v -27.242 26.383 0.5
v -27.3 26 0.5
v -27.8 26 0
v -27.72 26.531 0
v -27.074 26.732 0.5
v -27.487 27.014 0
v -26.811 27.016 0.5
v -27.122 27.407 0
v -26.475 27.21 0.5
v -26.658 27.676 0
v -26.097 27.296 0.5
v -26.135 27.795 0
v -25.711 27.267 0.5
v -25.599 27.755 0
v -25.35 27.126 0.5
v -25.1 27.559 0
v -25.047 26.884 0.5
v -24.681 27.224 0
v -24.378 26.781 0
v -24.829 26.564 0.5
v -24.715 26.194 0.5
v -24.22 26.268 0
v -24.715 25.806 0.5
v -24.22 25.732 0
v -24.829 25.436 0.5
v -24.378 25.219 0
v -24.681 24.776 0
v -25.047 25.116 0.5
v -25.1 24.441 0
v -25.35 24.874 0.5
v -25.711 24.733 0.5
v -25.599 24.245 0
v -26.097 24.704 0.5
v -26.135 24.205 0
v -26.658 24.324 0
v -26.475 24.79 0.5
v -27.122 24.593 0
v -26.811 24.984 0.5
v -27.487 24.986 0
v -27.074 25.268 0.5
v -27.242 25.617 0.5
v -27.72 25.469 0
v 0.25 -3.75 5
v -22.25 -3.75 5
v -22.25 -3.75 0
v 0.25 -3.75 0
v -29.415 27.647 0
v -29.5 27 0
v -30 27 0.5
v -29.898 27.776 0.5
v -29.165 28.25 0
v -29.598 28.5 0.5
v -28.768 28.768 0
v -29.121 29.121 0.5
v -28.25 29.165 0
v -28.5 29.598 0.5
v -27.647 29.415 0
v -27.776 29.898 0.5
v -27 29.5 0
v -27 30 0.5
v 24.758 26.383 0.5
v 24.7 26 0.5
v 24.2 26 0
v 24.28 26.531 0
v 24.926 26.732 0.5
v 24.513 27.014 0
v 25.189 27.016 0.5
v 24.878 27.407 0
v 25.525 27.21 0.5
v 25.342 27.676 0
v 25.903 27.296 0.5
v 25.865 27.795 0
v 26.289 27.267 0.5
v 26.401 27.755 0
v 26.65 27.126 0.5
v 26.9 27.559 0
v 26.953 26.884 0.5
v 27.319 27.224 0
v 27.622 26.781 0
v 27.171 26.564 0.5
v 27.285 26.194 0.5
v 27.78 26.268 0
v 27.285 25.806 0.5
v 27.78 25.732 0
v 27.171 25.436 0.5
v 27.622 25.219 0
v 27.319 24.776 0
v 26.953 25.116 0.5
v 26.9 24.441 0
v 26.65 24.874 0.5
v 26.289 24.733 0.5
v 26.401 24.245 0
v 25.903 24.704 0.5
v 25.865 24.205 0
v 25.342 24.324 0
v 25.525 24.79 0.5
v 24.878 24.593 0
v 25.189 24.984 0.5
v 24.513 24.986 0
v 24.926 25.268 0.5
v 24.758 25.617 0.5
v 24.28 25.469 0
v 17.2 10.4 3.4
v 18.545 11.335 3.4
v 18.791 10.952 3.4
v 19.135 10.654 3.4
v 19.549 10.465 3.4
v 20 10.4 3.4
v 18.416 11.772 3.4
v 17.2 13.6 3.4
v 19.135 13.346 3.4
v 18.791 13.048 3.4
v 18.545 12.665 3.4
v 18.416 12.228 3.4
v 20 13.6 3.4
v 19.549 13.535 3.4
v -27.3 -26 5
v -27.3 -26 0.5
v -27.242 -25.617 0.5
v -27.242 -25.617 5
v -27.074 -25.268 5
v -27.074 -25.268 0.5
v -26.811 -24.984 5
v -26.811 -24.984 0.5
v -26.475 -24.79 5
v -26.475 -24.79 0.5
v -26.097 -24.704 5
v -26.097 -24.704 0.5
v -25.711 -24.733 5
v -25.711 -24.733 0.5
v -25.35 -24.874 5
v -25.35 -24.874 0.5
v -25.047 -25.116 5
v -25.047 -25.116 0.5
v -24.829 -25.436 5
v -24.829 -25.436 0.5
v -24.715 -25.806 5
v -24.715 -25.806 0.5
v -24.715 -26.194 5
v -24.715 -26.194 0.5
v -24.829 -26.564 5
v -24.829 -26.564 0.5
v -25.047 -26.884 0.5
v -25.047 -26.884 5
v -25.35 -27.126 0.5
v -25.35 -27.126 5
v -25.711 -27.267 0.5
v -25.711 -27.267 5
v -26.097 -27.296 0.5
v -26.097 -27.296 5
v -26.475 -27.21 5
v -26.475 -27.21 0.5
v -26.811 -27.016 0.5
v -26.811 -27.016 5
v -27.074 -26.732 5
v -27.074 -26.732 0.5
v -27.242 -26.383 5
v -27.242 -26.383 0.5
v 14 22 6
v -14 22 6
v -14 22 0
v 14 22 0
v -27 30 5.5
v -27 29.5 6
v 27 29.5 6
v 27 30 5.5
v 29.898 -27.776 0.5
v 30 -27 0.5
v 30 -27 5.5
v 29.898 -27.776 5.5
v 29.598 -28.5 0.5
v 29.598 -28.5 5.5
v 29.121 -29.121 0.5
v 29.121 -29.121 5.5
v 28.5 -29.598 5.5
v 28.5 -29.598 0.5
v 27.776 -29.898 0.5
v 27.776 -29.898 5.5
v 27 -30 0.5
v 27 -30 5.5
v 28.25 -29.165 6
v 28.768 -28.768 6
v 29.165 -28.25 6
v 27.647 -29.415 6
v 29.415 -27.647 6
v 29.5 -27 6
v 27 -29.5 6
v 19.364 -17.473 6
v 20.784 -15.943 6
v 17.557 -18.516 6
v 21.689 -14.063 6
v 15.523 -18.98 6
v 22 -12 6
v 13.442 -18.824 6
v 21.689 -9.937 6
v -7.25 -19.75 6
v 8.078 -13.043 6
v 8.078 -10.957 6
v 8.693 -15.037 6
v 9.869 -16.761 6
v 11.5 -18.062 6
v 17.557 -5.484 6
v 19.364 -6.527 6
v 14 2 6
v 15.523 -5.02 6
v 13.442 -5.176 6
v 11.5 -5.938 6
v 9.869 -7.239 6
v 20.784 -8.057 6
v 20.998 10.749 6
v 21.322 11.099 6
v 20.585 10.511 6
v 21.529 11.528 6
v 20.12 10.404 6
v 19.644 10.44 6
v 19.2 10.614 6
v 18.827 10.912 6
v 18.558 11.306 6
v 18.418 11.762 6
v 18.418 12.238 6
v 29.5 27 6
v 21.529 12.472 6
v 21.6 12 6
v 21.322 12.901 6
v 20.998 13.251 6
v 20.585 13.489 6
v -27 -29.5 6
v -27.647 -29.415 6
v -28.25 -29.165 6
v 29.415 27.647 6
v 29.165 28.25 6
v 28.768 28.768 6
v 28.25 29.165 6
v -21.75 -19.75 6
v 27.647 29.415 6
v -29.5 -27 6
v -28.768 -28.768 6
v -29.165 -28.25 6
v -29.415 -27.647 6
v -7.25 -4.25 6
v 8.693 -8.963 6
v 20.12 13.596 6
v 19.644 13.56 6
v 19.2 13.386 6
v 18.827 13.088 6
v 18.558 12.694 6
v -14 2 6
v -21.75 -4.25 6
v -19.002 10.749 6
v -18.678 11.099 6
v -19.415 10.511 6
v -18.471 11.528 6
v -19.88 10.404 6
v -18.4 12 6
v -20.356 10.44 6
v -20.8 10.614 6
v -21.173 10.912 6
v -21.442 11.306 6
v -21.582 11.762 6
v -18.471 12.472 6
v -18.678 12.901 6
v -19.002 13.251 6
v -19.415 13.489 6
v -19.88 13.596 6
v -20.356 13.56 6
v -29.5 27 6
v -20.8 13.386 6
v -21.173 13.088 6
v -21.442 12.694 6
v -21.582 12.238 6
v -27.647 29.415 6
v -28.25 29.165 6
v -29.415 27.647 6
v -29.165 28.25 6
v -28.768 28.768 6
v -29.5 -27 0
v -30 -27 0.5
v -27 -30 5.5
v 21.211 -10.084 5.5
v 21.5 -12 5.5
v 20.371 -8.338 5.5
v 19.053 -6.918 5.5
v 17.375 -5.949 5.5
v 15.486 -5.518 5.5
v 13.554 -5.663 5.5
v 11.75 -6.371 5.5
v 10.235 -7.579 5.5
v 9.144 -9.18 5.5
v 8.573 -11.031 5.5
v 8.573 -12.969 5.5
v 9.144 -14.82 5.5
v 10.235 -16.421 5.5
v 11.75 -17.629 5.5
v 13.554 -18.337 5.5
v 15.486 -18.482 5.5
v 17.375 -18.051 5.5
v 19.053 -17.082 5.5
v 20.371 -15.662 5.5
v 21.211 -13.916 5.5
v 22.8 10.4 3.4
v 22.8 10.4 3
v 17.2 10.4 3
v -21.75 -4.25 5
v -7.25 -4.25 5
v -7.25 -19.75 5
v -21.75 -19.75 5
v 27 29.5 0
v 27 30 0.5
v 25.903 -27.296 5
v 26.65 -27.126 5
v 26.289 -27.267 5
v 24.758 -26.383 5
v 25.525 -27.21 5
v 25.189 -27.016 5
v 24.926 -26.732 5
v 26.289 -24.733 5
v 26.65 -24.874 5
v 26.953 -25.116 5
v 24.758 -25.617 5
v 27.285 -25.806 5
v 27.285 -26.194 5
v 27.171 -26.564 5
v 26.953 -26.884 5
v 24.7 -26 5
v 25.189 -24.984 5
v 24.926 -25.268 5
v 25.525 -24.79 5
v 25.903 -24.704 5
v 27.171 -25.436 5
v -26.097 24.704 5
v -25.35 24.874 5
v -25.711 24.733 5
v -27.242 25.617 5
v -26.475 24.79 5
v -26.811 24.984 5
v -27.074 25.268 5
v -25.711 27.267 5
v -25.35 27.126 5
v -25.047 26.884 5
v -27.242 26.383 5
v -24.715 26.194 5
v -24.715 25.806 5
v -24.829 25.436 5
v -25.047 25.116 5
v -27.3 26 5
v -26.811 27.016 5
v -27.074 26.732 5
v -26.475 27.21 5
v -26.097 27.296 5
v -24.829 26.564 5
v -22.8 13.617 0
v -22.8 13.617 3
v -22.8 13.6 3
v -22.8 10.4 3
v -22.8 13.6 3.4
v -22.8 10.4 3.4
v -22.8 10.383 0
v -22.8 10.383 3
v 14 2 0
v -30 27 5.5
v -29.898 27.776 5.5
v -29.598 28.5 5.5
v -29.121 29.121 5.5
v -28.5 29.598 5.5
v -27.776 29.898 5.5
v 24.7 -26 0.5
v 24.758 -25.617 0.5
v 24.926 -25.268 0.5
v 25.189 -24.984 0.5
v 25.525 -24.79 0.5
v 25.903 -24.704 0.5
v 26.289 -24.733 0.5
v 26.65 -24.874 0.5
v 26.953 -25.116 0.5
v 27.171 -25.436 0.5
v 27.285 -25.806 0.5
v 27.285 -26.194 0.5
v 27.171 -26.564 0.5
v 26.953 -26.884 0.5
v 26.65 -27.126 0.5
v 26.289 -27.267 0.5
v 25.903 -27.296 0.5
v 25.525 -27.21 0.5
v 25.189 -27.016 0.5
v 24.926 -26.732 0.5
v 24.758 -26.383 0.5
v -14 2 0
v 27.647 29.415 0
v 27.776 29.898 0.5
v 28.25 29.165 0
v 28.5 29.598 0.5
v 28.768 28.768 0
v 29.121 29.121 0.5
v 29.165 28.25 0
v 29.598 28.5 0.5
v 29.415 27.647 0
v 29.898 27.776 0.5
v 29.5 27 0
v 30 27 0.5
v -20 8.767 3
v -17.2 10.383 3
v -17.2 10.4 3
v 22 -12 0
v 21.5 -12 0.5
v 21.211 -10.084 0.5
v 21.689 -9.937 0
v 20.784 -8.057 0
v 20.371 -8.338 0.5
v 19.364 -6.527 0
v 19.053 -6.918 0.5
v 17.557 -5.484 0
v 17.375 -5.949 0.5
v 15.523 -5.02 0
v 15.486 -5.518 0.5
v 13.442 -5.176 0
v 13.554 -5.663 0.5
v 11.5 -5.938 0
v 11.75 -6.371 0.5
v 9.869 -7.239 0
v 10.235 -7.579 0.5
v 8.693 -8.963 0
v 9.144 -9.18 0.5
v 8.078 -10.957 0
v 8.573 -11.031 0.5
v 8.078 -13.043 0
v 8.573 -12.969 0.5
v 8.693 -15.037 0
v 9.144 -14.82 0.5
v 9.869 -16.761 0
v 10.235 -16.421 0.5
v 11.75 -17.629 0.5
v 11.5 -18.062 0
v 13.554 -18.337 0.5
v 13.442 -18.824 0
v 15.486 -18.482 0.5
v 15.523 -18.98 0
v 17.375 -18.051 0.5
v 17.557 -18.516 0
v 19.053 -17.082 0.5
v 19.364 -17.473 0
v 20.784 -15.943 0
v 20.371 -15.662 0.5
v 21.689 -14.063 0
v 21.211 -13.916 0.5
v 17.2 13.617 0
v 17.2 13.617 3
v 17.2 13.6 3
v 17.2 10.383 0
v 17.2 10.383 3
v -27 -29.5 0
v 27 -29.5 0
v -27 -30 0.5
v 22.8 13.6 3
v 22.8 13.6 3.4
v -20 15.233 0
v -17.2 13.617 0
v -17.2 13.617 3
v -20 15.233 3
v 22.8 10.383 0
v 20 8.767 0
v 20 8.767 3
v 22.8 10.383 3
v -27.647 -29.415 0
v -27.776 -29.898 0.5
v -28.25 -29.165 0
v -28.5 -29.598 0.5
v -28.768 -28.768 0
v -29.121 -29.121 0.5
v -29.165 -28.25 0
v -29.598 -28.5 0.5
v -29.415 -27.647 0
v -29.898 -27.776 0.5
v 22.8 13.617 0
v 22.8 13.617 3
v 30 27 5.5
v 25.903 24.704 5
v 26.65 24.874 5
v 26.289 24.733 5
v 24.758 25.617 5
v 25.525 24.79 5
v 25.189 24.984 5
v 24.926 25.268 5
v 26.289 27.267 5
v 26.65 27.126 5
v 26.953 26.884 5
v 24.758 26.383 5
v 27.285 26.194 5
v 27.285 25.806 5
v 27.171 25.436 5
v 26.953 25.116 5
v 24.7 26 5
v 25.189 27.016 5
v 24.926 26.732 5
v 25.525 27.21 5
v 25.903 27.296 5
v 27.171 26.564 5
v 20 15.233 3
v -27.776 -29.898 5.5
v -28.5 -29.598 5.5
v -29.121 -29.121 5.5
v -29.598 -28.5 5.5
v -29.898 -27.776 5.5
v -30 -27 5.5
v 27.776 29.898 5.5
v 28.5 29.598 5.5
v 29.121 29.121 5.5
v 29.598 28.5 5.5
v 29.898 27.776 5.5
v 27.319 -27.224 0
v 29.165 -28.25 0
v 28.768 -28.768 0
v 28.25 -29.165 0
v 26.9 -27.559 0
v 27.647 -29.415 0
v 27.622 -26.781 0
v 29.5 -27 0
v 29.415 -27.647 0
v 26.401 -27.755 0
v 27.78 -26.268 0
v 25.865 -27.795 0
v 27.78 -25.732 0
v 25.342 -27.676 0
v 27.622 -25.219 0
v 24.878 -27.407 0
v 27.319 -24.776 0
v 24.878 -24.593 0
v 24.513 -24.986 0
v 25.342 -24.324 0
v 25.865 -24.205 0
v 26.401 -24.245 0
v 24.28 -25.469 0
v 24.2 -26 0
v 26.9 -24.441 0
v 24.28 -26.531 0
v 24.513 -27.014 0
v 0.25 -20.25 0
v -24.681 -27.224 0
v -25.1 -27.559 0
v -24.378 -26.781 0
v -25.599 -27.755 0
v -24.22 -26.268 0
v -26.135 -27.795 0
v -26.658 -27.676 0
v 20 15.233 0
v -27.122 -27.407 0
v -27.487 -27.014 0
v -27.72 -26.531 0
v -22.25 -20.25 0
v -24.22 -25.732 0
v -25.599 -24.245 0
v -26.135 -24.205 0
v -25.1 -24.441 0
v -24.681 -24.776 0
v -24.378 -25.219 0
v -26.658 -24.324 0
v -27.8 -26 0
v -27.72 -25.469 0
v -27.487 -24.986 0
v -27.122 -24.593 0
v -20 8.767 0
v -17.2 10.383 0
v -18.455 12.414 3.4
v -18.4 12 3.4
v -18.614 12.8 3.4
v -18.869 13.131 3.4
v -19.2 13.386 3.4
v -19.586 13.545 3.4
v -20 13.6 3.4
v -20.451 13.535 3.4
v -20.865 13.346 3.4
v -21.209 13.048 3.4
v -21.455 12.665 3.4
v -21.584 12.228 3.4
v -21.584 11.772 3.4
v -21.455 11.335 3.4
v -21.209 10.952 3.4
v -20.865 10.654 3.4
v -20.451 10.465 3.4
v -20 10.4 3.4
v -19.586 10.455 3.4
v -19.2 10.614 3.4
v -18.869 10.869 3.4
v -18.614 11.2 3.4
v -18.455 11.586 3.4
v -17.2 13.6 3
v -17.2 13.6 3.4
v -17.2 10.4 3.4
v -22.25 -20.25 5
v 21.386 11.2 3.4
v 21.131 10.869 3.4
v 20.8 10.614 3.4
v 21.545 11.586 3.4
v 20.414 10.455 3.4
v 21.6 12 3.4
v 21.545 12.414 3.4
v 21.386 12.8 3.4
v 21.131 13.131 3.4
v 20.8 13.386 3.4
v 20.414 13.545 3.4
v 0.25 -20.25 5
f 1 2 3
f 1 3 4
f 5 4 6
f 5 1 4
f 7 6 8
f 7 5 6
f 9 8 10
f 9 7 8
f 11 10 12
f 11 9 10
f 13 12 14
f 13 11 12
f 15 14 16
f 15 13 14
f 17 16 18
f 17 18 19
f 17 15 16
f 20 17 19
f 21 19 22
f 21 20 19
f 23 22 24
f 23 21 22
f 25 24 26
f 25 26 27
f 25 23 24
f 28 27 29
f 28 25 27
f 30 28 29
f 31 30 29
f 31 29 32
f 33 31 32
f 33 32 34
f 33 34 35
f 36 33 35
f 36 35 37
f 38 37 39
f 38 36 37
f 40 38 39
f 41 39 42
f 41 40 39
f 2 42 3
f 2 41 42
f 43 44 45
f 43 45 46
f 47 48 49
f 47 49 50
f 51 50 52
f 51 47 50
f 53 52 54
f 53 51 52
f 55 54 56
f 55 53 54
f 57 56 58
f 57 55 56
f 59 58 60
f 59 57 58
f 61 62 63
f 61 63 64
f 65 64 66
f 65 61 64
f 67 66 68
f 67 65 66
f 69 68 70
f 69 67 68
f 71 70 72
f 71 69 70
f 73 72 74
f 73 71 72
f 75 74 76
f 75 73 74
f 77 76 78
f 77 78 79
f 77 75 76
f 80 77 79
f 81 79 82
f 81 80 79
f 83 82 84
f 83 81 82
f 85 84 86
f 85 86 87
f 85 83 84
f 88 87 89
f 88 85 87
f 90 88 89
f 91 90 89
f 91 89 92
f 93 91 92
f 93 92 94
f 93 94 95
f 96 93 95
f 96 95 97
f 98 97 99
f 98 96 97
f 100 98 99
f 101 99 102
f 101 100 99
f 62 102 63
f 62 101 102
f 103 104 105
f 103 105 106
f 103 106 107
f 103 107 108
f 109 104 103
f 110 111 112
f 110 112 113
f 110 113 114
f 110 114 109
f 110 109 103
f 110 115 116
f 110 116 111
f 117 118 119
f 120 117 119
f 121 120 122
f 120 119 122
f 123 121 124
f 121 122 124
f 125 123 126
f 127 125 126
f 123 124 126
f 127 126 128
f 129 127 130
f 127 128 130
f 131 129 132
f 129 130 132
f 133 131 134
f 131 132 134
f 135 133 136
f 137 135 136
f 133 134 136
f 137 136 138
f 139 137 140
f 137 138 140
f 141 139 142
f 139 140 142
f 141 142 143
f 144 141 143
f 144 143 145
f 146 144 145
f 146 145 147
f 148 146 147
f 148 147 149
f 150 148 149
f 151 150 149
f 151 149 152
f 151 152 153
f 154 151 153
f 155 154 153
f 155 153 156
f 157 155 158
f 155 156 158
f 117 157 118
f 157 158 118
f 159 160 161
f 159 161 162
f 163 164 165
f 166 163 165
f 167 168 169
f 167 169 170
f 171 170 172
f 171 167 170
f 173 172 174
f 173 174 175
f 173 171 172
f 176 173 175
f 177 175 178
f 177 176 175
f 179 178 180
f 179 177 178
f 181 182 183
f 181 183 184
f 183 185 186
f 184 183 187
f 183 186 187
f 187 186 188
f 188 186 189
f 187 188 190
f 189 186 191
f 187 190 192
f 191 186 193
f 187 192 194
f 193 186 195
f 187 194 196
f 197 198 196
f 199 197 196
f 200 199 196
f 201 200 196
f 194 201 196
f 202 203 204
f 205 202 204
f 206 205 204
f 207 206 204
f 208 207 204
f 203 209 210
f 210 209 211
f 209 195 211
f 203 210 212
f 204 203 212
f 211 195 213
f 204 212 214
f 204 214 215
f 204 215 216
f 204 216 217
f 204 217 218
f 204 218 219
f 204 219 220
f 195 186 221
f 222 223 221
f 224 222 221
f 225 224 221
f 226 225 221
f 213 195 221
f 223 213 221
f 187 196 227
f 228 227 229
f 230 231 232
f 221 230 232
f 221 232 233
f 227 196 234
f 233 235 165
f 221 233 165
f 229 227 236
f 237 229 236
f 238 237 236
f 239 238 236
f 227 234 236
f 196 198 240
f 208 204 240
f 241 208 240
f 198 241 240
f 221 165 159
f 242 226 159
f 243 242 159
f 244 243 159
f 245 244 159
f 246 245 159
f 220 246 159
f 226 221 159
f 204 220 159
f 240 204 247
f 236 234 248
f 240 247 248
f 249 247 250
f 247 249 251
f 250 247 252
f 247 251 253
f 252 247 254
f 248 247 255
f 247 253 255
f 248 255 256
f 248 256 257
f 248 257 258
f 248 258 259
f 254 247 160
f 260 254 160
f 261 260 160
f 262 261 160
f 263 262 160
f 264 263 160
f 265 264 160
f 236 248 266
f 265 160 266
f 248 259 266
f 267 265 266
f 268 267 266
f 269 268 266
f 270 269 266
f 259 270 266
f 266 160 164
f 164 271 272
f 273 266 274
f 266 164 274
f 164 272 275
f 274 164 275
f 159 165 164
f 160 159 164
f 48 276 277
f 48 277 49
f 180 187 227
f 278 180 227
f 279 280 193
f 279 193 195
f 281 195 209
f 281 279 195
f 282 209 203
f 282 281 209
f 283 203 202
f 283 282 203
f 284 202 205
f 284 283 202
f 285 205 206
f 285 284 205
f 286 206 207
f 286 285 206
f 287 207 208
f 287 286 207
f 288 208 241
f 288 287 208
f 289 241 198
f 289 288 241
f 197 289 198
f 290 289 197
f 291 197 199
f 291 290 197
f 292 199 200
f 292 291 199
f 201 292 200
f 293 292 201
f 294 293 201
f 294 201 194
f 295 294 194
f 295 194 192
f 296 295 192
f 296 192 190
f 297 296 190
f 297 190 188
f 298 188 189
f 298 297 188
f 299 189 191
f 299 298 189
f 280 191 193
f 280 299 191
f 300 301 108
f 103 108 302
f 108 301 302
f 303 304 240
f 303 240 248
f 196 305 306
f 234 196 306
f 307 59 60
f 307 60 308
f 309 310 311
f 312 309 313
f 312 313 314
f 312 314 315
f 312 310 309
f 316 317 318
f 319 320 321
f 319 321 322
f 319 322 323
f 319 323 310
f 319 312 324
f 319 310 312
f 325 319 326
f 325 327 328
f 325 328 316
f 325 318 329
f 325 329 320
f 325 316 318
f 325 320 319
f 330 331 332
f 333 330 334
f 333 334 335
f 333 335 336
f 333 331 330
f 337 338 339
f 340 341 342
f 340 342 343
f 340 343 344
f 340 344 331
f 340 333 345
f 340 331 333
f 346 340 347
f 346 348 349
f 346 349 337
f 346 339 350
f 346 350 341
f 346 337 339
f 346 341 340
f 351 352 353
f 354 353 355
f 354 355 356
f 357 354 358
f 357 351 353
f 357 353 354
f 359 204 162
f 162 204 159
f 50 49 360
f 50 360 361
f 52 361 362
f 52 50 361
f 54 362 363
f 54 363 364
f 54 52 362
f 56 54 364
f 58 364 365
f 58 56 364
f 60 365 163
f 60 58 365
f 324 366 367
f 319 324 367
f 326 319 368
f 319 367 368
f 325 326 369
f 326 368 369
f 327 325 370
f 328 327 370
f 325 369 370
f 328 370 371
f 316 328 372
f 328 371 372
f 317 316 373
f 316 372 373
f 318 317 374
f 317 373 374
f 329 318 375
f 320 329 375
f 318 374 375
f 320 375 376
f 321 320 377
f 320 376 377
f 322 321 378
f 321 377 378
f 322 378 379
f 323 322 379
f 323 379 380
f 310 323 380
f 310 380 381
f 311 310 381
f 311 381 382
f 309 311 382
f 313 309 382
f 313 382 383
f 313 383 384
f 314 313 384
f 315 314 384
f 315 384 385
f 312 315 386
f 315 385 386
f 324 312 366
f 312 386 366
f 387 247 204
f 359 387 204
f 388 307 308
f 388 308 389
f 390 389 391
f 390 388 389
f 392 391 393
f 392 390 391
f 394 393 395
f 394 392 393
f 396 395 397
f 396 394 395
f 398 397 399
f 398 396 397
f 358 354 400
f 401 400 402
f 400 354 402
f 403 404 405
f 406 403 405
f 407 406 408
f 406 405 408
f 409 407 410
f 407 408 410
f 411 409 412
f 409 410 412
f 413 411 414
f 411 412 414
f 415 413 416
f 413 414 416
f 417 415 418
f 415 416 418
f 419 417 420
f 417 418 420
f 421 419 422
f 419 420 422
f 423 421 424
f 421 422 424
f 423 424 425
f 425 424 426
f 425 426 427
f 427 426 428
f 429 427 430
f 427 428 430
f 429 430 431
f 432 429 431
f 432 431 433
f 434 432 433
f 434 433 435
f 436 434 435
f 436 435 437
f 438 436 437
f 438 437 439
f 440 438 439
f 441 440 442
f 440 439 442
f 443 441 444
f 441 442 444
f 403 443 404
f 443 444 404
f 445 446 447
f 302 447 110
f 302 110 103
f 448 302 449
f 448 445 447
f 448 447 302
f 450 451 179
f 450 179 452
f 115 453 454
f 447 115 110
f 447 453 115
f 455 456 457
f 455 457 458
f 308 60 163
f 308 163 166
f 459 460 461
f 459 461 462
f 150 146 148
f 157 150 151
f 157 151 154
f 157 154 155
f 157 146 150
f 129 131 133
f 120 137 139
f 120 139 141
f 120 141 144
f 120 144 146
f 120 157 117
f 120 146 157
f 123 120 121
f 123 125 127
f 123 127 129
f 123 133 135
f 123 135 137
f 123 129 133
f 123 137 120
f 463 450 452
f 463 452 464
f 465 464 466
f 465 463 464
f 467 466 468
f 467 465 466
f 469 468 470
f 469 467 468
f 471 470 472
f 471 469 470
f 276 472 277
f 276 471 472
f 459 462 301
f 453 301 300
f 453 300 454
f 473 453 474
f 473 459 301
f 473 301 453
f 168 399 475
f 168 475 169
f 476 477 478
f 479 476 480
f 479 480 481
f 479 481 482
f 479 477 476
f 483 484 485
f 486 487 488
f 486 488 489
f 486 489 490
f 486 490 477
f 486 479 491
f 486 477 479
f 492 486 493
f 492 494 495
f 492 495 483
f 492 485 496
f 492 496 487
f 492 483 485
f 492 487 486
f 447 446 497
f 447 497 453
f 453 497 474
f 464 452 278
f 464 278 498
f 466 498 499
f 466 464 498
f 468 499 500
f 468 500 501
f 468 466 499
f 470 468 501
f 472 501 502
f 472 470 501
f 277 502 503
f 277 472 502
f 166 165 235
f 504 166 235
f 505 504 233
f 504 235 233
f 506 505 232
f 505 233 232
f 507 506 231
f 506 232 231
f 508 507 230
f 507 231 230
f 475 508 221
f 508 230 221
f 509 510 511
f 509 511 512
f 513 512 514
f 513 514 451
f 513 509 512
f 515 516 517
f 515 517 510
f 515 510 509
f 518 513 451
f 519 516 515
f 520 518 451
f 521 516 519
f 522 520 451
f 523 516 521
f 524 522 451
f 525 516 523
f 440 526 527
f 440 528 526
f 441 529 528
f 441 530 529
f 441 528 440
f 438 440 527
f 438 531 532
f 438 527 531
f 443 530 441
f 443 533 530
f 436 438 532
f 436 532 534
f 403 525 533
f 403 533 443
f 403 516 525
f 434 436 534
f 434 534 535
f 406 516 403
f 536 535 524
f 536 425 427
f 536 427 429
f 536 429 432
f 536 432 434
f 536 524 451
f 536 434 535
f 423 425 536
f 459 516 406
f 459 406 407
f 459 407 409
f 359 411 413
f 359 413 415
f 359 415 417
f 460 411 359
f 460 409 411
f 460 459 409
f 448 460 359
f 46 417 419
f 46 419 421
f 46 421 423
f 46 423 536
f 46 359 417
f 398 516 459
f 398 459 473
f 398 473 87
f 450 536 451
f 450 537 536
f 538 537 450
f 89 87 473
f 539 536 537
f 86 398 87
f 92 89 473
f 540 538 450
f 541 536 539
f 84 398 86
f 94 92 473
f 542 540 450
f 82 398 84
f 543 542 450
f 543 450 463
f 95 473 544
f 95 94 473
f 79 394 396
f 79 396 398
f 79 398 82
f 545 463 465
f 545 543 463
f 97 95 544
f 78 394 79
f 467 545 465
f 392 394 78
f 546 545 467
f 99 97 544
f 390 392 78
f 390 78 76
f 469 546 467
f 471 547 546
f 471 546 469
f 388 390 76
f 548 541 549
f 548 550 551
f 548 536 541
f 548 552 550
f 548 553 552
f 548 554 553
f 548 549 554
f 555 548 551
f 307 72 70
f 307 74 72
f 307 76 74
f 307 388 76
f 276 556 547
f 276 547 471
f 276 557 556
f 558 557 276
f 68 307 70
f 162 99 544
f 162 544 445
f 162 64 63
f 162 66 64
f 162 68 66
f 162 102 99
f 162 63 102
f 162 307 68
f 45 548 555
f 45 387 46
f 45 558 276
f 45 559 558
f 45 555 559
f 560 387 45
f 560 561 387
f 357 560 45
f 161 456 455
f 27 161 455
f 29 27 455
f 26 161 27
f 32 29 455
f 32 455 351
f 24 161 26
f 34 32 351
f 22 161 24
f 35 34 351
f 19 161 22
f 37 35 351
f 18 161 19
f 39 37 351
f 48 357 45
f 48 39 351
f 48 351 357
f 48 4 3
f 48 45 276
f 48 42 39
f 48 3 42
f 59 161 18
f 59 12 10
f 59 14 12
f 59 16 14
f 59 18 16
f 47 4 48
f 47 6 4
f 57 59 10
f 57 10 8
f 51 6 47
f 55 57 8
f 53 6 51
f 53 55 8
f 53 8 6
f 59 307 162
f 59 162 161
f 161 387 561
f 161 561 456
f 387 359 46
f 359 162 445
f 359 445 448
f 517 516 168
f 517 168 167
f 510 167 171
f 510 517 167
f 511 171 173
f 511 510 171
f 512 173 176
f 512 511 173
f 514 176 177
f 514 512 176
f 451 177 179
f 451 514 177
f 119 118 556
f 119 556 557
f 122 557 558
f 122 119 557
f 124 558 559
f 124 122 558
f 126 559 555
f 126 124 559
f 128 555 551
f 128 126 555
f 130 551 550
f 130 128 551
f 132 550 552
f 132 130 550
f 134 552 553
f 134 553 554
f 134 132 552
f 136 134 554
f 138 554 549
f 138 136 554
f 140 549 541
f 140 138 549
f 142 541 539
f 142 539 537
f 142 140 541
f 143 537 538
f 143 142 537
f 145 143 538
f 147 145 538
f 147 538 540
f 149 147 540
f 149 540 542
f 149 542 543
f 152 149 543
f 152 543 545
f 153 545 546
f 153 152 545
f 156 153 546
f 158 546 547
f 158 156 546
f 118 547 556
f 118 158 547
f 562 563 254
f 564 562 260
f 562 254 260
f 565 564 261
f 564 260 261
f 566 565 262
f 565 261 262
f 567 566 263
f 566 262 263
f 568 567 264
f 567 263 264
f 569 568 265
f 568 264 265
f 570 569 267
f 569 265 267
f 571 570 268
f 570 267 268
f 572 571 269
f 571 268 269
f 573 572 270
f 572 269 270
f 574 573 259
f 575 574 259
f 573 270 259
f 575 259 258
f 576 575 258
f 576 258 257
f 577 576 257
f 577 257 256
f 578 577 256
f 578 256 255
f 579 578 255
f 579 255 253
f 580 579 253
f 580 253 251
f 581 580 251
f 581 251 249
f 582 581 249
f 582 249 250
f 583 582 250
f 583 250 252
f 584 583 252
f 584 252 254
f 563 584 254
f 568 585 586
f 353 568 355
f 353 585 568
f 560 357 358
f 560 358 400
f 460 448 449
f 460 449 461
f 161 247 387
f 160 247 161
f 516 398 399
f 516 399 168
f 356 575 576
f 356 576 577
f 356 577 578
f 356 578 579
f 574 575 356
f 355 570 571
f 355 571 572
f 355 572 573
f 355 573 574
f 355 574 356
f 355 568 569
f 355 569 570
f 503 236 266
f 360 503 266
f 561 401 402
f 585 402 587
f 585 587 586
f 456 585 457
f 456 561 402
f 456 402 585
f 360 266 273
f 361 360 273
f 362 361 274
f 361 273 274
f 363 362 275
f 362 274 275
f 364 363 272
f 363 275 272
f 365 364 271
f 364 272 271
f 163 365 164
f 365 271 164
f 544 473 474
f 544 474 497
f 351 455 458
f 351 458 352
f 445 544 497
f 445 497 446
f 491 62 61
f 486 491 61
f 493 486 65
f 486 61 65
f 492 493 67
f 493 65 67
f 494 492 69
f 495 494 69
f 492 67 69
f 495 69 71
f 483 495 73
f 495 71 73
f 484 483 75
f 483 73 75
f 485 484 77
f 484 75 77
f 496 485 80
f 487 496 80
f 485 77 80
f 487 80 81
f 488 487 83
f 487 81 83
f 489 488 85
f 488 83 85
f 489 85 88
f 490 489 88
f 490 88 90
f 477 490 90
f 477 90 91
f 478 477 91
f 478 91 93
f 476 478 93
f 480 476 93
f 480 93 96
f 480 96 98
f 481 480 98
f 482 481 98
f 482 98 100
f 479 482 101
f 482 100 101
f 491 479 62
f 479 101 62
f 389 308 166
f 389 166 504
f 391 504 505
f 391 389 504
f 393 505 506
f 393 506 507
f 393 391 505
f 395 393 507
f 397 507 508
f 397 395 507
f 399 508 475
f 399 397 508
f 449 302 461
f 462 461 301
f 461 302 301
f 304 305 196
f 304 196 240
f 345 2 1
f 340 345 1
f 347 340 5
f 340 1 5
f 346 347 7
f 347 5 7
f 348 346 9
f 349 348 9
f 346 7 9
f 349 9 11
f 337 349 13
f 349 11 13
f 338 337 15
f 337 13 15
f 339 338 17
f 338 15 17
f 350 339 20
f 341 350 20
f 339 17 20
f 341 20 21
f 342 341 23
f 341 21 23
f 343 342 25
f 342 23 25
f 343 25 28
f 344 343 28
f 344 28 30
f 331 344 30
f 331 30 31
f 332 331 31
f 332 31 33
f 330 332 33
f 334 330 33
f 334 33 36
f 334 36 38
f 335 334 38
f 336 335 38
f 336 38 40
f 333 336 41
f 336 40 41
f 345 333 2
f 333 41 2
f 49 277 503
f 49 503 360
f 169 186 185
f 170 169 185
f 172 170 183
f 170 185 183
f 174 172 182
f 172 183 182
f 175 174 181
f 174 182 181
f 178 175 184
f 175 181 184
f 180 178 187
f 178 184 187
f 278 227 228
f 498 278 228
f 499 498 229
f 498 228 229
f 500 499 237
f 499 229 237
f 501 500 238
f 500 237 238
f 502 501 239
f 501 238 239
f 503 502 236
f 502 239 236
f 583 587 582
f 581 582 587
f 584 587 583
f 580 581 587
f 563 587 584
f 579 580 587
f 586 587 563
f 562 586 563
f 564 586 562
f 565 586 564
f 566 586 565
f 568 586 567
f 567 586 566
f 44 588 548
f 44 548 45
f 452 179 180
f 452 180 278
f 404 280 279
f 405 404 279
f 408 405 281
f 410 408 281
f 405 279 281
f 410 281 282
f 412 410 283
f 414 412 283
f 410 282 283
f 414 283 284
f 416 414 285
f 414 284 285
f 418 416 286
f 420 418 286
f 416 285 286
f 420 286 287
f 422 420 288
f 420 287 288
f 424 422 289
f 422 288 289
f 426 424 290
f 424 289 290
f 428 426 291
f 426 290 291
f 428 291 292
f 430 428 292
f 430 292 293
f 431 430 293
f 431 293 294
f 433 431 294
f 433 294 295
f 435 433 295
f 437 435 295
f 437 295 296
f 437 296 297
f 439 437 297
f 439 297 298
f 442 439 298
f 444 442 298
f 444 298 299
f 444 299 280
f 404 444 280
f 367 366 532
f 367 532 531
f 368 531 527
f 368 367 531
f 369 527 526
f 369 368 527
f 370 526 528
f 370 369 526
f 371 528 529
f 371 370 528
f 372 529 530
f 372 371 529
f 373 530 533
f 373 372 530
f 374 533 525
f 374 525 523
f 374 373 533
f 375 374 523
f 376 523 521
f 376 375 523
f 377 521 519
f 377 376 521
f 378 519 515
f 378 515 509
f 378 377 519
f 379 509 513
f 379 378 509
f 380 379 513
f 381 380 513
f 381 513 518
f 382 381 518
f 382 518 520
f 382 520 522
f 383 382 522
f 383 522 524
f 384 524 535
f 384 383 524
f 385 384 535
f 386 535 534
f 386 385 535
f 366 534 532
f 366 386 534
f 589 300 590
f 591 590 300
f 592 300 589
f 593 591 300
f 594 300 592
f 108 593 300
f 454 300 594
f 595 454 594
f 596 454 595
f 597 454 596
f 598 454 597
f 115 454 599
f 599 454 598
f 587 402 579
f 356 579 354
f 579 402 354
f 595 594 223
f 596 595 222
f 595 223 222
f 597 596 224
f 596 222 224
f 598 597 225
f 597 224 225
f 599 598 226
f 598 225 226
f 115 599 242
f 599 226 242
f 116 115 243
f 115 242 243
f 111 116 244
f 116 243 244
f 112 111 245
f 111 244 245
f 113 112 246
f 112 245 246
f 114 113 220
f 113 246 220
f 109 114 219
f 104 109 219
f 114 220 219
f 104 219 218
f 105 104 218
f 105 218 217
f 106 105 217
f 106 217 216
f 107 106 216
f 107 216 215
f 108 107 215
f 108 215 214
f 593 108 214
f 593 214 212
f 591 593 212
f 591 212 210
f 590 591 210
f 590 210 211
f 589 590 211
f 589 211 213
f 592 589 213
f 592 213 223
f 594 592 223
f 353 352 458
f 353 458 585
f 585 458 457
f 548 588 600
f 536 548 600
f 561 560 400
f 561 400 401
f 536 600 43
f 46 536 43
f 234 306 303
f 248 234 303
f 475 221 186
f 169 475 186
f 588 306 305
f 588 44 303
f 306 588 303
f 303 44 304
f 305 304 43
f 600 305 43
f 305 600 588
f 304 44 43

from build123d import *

# Parameters (mm, degrees)
BOSS_EXTRUDE1_DEPTH = 6
SKETCH2_R           = 1.6
SKETCH2_R_2         = 6.5
SKETCH2_W           = 28
SKETCH2_H           = 20
CUT_EXTRUDE1_DEPTH  = 43.848570571
CUT_EXTRUDE2_START  = -1
SKETCH3_W           = 22.5
SKETCH3_H           = 16.5
CUT_EXTRUDE2_DEPTH  = 42.848570571
SKETCH4_W           = 14.5
SKETCH4_H           = 15.5
CUT_EXTRUDE3_DEPTH  = 43.720018727
CUT_EXTRUDE4_DEPTH  = 3
SKETCH6_W           = 5.6
SKETCH6_H           = 3.2
CUT_EXTRUDE5_DEPTH  = 0.4
SKETCH7_R           = 1.3
CUT_EXTRUDE6_DEPTH  = 5
CHAMFER2_SIZE       = 0.5


with BuildPart() as part:
    # Sketch1 → Boss-Extrude1 (new body)
    with BuildSketch(Plane.XY):
        with BuildLine():
            Line((-27, 30), (27, 30))
            ThreePointArc((27, 30), (29.121320344, 29.121320344), (30, 27))
            Line((30, 27), (30, -27))
            ThreePointArc((30, -27), (29.121320344, -29.121320344), (27, -30))
            Line((27, -30), (-27, -30))
            ThreePointArc((-27, -30), (-29.121320344, -29.121320344), (-30, -27))
            Line((-30, -27), (-30, 27))
            ThreePointArc((-30, 27), (-29.121320344, 29.121320344), (-27, 30))
        make_face()
    extrude(amount=BOSS_EXTRUDE1_DEPTH)

    # Sketch2 → Cut-Extrude1 (cut, through all)
    with BuildSketch(Plane.XY.offset(6)):
        with Locations((-20, 12)):
            Circle(SKETCH2_R)
        with Locations((20, 12)):
            Circle(SKETCH2_R)
        with Locations((15, -12)):
            Circle(SKETCH2_R_2)
        with Locations((0, 12)):
            Rectangle(SKETCH2_W, SKETCH2_H)
    extrude(amount=-CUT_EXTRUDE1_DEPTH, mode=Mode.SUBTRACT)

    # Sketch3 → Cut-Extrude2 (cut, through all)
    with BuildSketch(Plane.XY.offset(6).offset(CUT_EXTRUDE2_START)):
        with Locations((-11, -12)):
            Rectangle(SKETCH3_W, SKETCH3_H)
    extrude(amount=-CUT_EXTRUDE2_DEPTH, mode=Mode.SUBTRACT)

    # Sketch4 → Cut-Extrude3 (cut, through all)
    with BuildSketch(Plane(origin=(0, 0, 5), x_dir=(-1, 0, 0), z_dir=(0, 0, -1))):
        with Locations((14.5, -12)):
            Rectangle(SKETCH4_W, SKETCH4_H)
    extrude(amount=-CUT_EXTRUDE3_DEPTH, mode=Mode.SUBTRACT)

    # Sketch5 → Cut-Extrude4 (cut)
    with BuildSketch(Plane.XY):
        Polygon((-20, 8.766838493), (-17.2, 10.383419246), (-17.2, 13.616580754), (-20, 15.233161507), (-22.8, 13.616580754), (-22.8, 10.383419246), align=None)
        Polygon((20, 8.766838493), (22.8, 10.383419246), (22.8, 13.616580754), (20, 15.233161507), (17.2, 13.616580754), (17.2, 10.383419246), align=None)
    extrude(amount=CUT_EXTRUDE4_DEPTH, mode=Mode.SUBTRACT)

    # Sketch6 → Cut-Extrude5 (cut)
    with BuildSketch(Plane(origin=(0, 0, 3), x_dir=(-1, 0, 0), z_dir=(0, 0, -1))):
        with Locations((20, 12)):
            Rectangle(SKETCH6_W, SKETCH6_H)
        with Locations((-20, 12)):
            Rectangle(SKETCH6_W, SKETCH6_H)
    extrude(amount=-CUT_EXTRUDE5_DEPTH, mode=Mode.SUBTRACT)

    # Sketch7 → Cut-Extrude6 (cut)
    with BuildSketch(Plane(origin=(0, 0, 0), x_dir=(-1, 0, 0), z_dir=(0, 0, -1))):
        with Locations((-26, 26)):
            Circle(SKETCH7_R)
        with Locations((26, 26)):
            Circle(SKETCH7_R)
        with Locations((26, -26)):
            Circle(SKETCH7_R)
        with Locations((-26, -26)):
            Circle(SKETCH7_R)
    extrude(amount=-CUT_EXTRUDE6_DEPTH, mode=Mode.SUBTRACT)

    # Chamfer2
    chamfer2_edges = [part.edges().sort_by_distance(p)[0] for p in [
        (-29.121320344, 29.121320344, 6),
        (0, 30, 0),
        (29.121320344, 29.121320344, 0),
        (-30, 0, 6),
        (-29.121320344, -29.121320344, 6),
        (27.3, 26, 0),
        (-24.7, 26, 0),
        (-24.7, -26, 0),
        (27.3, -26, 0),
        (0, -30, 6),
        (29.121320344, -29.121320344, 6),
        (30, 0, 6),
        (29.121320344, 29.121320344, 6),
        (8.5, -12, 0),
        (8.5, -12, 6),
        (0, 30, 6),
        (30, 0, 0),
        (29.121320344, -29.121320344, 0),
        (0, -30, 0),
        (-29.121320344, -29.121320344, 0),
        (-30, 0, 0),
        (-29.121320344, 29.121320344, 0),
    ]]
    chamfer(chamfer2_edges, length=CHAMFER2_SIZE)


solid = part.part
